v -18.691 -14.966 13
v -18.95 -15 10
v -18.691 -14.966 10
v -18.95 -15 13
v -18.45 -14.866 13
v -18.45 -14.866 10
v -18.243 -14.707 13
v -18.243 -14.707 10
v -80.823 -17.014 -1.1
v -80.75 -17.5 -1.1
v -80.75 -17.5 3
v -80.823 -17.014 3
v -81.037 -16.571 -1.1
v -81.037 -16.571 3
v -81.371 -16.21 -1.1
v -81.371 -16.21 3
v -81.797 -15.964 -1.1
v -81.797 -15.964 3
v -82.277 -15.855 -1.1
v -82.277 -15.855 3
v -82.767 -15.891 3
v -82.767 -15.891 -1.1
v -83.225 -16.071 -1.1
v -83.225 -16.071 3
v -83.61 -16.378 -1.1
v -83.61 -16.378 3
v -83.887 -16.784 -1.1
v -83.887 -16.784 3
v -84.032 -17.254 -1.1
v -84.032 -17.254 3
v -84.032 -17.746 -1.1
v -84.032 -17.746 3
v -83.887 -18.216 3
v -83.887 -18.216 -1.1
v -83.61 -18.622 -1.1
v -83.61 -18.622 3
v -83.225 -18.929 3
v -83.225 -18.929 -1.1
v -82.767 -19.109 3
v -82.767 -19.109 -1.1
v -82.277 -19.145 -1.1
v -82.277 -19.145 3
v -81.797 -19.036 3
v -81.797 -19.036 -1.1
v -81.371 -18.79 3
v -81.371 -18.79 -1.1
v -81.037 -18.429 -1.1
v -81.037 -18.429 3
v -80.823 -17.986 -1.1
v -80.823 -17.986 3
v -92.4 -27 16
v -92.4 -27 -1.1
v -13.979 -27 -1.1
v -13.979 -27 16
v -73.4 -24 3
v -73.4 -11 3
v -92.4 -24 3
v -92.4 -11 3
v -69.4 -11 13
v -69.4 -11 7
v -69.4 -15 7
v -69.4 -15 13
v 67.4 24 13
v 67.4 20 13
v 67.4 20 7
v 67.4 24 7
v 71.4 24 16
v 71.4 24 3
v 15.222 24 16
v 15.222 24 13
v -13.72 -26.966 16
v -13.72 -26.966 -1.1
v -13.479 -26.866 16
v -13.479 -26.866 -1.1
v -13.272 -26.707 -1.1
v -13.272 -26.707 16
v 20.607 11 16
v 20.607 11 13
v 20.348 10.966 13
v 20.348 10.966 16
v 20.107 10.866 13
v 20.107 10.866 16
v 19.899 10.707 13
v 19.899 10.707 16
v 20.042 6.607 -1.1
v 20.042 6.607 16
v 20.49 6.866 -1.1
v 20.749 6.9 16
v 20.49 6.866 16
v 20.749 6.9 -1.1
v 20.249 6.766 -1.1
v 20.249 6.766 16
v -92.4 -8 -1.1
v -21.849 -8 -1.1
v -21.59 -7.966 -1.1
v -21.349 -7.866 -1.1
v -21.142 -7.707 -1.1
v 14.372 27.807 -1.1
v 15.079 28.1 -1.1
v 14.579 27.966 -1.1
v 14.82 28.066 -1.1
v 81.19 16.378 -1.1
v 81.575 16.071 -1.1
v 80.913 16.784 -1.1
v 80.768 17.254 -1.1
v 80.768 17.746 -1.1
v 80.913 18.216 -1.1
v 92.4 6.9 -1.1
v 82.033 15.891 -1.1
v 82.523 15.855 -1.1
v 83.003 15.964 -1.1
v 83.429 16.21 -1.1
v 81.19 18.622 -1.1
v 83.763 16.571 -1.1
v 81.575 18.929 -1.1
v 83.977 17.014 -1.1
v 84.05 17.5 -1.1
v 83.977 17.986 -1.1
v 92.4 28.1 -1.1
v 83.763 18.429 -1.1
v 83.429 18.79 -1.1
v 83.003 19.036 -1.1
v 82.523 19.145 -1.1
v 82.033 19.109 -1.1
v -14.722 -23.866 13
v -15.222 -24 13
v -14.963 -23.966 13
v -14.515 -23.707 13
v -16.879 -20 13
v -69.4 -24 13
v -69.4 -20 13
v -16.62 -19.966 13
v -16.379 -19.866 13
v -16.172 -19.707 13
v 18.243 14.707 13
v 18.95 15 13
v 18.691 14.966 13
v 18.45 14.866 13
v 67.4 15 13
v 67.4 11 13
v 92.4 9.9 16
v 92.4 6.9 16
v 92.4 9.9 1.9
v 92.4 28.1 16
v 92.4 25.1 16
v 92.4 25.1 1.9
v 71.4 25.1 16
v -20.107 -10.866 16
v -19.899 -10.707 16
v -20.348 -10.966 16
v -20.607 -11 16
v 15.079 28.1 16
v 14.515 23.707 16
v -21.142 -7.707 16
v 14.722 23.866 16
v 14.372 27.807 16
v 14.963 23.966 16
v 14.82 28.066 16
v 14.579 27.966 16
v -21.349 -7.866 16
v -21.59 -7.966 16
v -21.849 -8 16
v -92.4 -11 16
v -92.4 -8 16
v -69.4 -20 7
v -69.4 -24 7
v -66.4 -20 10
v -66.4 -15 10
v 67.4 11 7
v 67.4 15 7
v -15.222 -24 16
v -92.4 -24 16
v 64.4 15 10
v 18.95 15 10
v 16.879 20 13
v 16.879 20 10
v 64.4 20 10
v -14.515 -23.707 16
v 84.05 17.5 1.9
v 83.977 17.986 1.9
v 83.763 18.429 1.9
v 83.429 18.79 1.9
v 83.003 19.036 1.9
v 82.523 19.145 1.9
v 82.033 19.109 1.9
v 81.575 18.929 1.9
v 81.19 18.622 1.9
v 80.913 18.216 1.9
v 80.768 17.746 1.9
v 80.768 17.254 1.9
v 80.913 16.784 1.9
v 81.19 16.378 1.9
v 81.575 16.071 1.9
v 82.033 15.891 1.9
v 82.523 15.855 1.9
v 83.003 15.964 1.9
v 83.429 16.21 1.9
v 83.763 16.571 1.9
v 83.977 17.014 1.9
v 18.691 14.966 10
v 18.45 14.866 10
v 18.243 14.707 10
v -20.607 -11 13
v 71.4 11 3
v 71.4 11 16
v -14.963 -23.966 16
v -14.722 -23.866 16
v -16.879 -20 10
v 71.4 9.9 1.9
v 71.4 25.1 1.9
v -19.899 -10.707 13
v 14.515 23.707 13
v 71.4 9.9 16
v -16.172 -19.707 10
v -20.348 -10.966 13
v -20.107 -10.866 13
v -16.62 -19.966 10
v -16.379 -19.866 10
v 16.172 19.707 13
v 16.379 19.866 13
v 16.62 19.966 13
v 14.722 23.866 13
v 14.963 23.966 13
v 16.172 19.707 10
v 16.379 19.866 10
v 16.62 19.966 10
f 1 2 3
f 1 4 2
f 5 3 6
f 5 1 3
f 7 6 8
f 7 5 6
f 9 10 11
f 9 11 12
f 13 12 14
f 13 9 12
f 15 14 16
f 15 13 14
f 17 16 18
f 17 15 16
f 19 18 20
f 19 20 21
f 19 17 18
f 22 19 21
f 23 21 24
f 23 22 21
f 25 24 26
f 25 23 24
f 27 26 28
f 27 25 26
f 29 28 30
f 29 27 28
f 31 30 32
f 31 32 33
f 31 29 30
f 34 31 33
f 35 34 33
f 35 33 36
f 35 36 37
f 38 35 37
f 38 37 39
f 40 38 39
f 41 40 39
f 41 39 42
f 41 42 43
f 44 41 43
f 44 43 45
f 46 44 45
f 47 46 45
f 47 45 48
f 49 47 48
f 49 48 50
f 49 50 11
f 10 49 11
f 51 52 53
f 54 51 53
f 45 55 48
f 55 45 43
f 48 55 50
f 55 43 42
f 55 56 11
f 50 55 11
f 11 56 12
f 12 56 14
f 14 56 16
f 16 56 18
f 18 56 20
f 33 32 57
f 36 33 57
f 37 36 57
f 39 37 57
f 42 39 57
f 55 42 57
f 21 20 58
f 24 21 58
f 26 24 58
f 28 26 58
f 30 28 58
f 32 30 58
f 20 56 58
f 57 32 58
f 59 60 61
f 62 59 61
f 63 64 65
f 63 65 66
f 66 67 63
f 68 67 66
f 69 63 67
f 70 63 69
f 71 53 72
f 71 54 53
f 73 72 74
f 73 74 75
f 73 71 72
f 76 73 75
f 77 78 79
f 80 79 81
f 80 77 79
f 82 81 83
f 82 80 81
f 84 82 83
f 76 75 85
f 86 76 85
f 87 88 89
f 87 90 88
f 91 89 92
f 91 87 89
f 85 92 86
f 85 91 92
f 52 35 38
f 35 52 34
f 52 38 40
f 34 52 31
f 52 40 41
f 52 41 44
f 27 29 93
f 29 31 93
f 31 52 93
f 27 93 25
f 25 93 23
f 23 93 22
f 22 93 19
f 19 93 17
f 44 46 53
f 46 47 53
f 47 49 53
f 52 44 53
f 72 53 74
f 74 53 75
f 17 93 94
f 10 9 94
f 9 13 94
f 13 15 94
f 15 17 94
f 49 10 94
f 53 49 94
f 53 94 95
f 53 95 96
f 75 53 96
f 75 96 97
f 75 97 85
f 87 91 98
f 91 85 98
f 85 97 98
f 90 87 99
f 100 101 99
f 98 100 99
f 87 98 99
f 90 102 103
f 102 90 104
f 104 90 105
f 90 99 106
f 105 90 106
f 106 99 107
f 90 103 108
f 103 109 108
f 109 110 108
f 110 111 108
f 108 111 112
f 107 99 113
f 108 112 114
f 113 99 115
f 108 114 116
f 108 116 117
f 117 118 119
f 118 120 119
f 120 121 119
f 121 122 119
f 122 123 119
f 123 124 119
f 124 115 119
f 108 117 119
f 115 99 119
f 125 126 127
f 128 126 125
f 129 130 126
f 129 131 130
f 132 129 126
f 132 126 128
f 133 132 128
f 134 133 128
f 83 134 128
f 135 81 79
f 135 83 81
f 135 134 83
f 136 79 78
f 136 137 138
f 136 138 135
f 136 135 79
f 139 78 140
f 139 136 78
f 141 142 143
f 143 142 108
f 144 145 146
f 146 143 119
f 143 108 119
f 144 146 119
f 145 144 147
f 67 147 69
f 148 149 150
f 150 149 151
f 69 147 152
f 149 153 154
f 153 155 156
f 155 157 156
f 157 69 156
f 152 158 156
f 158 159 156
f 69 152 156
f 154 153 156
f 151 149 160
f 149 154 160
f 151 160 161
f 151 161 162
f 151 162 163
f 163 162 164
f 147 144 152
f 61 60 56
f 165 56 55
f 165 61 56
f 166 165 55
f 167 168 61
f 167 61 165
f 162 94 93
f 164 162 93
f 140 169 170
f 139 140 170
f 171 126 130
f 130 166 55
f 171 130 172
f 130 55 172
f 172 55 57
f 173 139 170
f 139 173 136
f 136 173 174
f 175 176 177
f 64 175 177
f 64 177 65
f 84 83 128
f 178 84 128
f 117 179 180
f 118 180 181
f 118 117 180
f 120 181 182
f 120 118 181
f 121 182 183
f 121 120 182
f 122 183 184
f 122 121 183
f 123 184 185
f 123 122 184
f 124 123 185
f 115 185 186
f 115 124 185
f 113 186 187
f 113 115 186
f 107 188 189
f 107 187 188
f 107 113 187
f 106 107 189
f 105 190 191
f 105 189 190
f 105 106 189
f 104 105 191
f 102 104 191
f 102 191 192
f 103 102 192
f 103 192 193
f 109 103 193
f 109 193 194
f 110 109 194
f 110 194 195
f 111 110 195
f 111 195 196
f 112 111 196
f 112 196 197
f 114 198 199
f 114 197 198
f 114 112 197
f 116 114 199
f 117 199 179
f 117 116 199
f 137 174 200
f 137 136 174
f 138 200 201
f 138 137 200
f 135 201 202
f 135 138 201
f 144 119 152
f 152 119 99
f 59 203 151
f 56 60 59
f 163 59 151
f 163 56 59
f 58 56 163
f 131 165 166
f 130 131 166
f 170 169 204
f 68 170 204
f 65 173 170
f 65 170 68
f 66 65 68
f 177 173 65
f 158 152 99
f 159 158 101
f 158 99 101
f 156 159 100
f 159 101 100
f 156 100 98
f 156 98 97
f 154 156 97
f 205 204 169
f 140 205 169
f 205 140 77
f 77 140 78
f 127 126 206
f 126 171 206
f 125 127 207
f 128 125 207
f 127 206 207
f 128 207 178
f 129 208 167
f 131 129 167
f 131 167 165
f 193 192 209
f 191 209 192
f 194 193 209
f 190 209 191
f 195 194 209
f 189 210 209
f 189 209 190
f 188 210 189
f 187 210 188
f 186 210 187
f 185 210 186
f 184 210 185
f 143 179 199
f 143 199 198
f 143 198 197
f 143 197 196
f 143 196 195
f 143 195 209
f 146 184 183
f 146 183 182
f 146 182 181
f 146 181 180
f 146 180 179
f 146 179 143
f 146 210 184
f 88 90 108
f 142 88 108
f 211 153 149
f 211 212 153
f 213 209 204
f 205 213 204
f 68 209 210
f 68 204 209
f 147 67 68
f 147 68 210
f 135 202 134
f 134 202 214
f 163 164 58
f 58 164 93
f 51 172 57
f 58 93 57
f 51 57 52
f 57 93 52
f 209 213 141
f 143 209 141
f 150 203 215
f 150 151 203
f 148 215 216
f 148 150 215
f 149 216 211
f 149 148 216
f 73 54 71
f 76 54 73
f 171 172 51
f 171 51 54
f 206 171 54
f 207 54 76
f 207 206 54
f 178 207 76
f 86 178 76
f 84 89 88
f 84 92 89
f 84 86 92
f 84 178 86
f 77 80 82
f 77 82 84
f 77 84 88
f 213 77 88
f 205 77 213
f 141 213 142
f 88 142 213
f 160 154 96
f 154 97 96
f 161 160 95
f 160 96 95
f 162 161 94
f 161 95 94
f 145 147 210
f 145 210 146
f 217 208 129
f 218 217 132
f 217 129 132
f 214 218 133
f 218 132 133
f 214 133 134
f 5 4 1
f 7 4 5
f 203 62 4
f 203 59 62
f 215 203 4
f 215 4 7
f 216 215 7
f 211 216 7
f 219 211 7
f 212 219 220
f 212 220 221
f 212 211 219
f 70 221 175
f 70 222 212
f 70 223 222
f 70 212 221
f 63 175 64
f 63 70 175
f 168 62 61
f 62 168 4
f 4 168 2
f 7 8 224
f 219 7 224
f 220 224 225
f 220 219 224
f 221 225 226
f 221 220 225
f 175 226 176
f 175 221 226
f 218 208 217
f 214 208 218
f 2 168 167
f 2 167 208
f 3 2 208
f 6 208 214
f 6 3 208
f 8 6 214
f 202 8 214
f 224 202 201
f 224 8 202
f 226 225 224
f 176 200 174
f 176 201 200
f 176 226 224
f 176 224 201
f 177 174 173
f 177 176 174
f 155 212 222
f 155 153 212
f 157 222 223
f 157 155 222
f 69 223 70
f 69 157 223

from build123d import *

# Parameters (mm, degrees)
SKETCH_10_R         = 1.65
EXTRUDE_1_DEPTH     = 3
EXTRUDE_START       = 3
EXTRUDE_2_DEPTH     = 7
EXTRUDE_3_DEPTH     = 13
CHAMFER_1_SIZE      = 7
EXTRUDE_5_DEPTH     = 10
EXTRUDE_START_2     = -1.1
SKETCH_16_R         = 1.65
EXTRUDE_6_DEPTH     = 4.1
EXTRUDE_7_DEPTH     = 16
SKETCH_18_W         = 21
SKETCH_18_H         = 15.2
CUT_EXTRUDE_1_DEPTH = 14.1
FILLET_1_R          = 1


with BuildPart() as part:
    # 草图10 → 凸台-拉伸1 (new body)
    with BuildSketch(Plane.XY):
        Polygon((-92.4, -8), (-21.435028843, -8), (13.564971157, 27), (92.4, 27), (92.4, 8), (21.435028843, 8), (-13.564971157, -27), (-92.4, -27), align=None)
        with Locations((-82.4, -17.5)):
            Circle(SKETCH_10_R, mode=Mode.SUBTRACT)
        with Locations((82.4, 17.5)):
            Circle(SKETCH_10_R, mode=Mode.SUBTRACT)
    extrude(amount=EXTRUDE_1_DEPTH)

    # 草图11 → 凸台-拉伸2 (add)
    with BuildSketch(Plane.XY.offset(EXTRUDE_START)):
        Polygon((-73.4, -8), (-73.4, -27), (-13.564971157, -27), (21.435028843, 8), (71.4, 8), (71.4, 27), (13.564971157, 27), (-21.435028843, -8), align=None)
    extrude(amount=EXTRUDE_2_DEPTH)

    # 草图12 → 凸台-拉伸3 (add)
    with BuildSketch(Plane.XY.offset(EXTRUDE_START)):
        Polygon((-92.4, -8), (-21.435028843, -8), (13.564971157, 27), (92.4, 27), (92.4, 24), (14.807611845, 24), (-20.192388155, -11), (-92.4, -11), align=None)
        Polygon((-92.4, -24), (-92.4, -27), (-13.564971157, -27), (21.435028843, 8), (92.4, 8), (92.4, 11), (20.192388155, 11), (-14.807611845, -24), align=None)
    extrude(amount=EXTRUDE_3_DEPTH)

    # 倒角1
    chamfer_1_edges = [part.edges().sort_by_distance(p)[0] for p in [
        (71.4, 17.5, 10),
        (-73.4, -17.5, 10),
    ]]
    chamfer(chamfer_1_edges, length=CHAMFER_1_SIZE - 0.0001)  # a hair under: the kernel refuses the full size

    # 草图15 → 凸台-拉伸5 (add)
    with BuildSketch(Plane.XY.offset(3)):
        Polygon((-69.4, -11), (-69.4, -15), (-18.535533906, -15), (16.464466094, 20), (67.4, 20), (67.4, 24), (14.807611845, 24), (-20.192388155, -11), align=None)
        Polygon((-69.4, -20), (-69.4, -24), (-14.807611845, -24), (20.192388155, 11), (67.4, 11), (67.4, 15), (18.535533906, 15), (-16.464466094, -20), align=None)
    extrude(amount=EXTRUDE_5_DEPTH)

    # 草图16 → 凸台-拉伸6 (add)
    with BuildSketch(Plane.XY.offset(EXTRUDE_START_2)):
        Polygon((-92.4, -8), (-92.4, -27), (-13.564971157, -27), (20.335028843, 6.9), (92.4, 6.9), (92.4, 28.1), (14.664971157, 28.1), (-21.435028843, -8), align=None)
        with Locations((-82.4, -17.5)):
            Circle(SKETCH_16_R, mode=Mode.SUBTRACT)
        with Locations((82.4, 17.5)):
            Circle(SKETCH_16_R, mode=Mode.SUBTRACT)
    extrude(amount=EXTRUDE_6_DEPTH)

    # 草图17 → 凸台-拉伸7 (add)
    with BuildSketch(Plane.XY):
        Polygon((92.4, 28.1), (92.4, 24), (14.807611845, 24), (12.686291501, 26.121320344), (14.664971157, 28.1), align=None)
        Polygon((92.4, 6.9), (20.335028843, 6.9), (18.213708499, 9.021320344), (20.192388155, 11), (92.4, 11), align=None)
    extrude(amount=EXTRUDE_7_DEPTH)

    # 草图18 → 切除-拉伸1 (cut)
    with BuildSketch(Plane.XY.offset(16)):
        with Locations((81.9, 17.5)):
            Rectangle(SKETCH_18_W, SKETCH_18_H)
    extrude(amount=-CUT_EXTRUDE_1_DEPTH, mode=Mode.SUBTRACT)


with BuildPart() as cut_extrude_1_kept_piece:
    # of the separate pieces the step leaves, the one the design keeps (cut_extrude_1_pieces_kept)
    add(part.part.solids().sort_by_distance((-73.4, -24, 3.0001))[0])

    # 圆角1
    fillet_1_edges = [cut_extrude_1_kept_piece.edges().sort_by_distance(p)[0] for p in [
        (-21.435028843, -8, 7.45),
        (-13.564971157, -27, 7.45),
        (-18.535533906, -15, 11.5),
        (16.464466094, 20, 11.5),
        (-16.464466094, -20, 11.5),
        (18.535533906, 15, 11.5),
        (20.335028843, 6.9, 7.45),
        (14.664971157, 28.1, 7.45),
        (14.807611845, 24, 14.5),
        (-20.192388155, -11, 14.5),
        (-14.807611845, -24, 14.5),
        (20.192388155, 11, 14.5),
    ]]
    fillet(fillet_1_edges, radius=FILLET_1_R)


solid = cut_extrude_1_kept_piece.part
